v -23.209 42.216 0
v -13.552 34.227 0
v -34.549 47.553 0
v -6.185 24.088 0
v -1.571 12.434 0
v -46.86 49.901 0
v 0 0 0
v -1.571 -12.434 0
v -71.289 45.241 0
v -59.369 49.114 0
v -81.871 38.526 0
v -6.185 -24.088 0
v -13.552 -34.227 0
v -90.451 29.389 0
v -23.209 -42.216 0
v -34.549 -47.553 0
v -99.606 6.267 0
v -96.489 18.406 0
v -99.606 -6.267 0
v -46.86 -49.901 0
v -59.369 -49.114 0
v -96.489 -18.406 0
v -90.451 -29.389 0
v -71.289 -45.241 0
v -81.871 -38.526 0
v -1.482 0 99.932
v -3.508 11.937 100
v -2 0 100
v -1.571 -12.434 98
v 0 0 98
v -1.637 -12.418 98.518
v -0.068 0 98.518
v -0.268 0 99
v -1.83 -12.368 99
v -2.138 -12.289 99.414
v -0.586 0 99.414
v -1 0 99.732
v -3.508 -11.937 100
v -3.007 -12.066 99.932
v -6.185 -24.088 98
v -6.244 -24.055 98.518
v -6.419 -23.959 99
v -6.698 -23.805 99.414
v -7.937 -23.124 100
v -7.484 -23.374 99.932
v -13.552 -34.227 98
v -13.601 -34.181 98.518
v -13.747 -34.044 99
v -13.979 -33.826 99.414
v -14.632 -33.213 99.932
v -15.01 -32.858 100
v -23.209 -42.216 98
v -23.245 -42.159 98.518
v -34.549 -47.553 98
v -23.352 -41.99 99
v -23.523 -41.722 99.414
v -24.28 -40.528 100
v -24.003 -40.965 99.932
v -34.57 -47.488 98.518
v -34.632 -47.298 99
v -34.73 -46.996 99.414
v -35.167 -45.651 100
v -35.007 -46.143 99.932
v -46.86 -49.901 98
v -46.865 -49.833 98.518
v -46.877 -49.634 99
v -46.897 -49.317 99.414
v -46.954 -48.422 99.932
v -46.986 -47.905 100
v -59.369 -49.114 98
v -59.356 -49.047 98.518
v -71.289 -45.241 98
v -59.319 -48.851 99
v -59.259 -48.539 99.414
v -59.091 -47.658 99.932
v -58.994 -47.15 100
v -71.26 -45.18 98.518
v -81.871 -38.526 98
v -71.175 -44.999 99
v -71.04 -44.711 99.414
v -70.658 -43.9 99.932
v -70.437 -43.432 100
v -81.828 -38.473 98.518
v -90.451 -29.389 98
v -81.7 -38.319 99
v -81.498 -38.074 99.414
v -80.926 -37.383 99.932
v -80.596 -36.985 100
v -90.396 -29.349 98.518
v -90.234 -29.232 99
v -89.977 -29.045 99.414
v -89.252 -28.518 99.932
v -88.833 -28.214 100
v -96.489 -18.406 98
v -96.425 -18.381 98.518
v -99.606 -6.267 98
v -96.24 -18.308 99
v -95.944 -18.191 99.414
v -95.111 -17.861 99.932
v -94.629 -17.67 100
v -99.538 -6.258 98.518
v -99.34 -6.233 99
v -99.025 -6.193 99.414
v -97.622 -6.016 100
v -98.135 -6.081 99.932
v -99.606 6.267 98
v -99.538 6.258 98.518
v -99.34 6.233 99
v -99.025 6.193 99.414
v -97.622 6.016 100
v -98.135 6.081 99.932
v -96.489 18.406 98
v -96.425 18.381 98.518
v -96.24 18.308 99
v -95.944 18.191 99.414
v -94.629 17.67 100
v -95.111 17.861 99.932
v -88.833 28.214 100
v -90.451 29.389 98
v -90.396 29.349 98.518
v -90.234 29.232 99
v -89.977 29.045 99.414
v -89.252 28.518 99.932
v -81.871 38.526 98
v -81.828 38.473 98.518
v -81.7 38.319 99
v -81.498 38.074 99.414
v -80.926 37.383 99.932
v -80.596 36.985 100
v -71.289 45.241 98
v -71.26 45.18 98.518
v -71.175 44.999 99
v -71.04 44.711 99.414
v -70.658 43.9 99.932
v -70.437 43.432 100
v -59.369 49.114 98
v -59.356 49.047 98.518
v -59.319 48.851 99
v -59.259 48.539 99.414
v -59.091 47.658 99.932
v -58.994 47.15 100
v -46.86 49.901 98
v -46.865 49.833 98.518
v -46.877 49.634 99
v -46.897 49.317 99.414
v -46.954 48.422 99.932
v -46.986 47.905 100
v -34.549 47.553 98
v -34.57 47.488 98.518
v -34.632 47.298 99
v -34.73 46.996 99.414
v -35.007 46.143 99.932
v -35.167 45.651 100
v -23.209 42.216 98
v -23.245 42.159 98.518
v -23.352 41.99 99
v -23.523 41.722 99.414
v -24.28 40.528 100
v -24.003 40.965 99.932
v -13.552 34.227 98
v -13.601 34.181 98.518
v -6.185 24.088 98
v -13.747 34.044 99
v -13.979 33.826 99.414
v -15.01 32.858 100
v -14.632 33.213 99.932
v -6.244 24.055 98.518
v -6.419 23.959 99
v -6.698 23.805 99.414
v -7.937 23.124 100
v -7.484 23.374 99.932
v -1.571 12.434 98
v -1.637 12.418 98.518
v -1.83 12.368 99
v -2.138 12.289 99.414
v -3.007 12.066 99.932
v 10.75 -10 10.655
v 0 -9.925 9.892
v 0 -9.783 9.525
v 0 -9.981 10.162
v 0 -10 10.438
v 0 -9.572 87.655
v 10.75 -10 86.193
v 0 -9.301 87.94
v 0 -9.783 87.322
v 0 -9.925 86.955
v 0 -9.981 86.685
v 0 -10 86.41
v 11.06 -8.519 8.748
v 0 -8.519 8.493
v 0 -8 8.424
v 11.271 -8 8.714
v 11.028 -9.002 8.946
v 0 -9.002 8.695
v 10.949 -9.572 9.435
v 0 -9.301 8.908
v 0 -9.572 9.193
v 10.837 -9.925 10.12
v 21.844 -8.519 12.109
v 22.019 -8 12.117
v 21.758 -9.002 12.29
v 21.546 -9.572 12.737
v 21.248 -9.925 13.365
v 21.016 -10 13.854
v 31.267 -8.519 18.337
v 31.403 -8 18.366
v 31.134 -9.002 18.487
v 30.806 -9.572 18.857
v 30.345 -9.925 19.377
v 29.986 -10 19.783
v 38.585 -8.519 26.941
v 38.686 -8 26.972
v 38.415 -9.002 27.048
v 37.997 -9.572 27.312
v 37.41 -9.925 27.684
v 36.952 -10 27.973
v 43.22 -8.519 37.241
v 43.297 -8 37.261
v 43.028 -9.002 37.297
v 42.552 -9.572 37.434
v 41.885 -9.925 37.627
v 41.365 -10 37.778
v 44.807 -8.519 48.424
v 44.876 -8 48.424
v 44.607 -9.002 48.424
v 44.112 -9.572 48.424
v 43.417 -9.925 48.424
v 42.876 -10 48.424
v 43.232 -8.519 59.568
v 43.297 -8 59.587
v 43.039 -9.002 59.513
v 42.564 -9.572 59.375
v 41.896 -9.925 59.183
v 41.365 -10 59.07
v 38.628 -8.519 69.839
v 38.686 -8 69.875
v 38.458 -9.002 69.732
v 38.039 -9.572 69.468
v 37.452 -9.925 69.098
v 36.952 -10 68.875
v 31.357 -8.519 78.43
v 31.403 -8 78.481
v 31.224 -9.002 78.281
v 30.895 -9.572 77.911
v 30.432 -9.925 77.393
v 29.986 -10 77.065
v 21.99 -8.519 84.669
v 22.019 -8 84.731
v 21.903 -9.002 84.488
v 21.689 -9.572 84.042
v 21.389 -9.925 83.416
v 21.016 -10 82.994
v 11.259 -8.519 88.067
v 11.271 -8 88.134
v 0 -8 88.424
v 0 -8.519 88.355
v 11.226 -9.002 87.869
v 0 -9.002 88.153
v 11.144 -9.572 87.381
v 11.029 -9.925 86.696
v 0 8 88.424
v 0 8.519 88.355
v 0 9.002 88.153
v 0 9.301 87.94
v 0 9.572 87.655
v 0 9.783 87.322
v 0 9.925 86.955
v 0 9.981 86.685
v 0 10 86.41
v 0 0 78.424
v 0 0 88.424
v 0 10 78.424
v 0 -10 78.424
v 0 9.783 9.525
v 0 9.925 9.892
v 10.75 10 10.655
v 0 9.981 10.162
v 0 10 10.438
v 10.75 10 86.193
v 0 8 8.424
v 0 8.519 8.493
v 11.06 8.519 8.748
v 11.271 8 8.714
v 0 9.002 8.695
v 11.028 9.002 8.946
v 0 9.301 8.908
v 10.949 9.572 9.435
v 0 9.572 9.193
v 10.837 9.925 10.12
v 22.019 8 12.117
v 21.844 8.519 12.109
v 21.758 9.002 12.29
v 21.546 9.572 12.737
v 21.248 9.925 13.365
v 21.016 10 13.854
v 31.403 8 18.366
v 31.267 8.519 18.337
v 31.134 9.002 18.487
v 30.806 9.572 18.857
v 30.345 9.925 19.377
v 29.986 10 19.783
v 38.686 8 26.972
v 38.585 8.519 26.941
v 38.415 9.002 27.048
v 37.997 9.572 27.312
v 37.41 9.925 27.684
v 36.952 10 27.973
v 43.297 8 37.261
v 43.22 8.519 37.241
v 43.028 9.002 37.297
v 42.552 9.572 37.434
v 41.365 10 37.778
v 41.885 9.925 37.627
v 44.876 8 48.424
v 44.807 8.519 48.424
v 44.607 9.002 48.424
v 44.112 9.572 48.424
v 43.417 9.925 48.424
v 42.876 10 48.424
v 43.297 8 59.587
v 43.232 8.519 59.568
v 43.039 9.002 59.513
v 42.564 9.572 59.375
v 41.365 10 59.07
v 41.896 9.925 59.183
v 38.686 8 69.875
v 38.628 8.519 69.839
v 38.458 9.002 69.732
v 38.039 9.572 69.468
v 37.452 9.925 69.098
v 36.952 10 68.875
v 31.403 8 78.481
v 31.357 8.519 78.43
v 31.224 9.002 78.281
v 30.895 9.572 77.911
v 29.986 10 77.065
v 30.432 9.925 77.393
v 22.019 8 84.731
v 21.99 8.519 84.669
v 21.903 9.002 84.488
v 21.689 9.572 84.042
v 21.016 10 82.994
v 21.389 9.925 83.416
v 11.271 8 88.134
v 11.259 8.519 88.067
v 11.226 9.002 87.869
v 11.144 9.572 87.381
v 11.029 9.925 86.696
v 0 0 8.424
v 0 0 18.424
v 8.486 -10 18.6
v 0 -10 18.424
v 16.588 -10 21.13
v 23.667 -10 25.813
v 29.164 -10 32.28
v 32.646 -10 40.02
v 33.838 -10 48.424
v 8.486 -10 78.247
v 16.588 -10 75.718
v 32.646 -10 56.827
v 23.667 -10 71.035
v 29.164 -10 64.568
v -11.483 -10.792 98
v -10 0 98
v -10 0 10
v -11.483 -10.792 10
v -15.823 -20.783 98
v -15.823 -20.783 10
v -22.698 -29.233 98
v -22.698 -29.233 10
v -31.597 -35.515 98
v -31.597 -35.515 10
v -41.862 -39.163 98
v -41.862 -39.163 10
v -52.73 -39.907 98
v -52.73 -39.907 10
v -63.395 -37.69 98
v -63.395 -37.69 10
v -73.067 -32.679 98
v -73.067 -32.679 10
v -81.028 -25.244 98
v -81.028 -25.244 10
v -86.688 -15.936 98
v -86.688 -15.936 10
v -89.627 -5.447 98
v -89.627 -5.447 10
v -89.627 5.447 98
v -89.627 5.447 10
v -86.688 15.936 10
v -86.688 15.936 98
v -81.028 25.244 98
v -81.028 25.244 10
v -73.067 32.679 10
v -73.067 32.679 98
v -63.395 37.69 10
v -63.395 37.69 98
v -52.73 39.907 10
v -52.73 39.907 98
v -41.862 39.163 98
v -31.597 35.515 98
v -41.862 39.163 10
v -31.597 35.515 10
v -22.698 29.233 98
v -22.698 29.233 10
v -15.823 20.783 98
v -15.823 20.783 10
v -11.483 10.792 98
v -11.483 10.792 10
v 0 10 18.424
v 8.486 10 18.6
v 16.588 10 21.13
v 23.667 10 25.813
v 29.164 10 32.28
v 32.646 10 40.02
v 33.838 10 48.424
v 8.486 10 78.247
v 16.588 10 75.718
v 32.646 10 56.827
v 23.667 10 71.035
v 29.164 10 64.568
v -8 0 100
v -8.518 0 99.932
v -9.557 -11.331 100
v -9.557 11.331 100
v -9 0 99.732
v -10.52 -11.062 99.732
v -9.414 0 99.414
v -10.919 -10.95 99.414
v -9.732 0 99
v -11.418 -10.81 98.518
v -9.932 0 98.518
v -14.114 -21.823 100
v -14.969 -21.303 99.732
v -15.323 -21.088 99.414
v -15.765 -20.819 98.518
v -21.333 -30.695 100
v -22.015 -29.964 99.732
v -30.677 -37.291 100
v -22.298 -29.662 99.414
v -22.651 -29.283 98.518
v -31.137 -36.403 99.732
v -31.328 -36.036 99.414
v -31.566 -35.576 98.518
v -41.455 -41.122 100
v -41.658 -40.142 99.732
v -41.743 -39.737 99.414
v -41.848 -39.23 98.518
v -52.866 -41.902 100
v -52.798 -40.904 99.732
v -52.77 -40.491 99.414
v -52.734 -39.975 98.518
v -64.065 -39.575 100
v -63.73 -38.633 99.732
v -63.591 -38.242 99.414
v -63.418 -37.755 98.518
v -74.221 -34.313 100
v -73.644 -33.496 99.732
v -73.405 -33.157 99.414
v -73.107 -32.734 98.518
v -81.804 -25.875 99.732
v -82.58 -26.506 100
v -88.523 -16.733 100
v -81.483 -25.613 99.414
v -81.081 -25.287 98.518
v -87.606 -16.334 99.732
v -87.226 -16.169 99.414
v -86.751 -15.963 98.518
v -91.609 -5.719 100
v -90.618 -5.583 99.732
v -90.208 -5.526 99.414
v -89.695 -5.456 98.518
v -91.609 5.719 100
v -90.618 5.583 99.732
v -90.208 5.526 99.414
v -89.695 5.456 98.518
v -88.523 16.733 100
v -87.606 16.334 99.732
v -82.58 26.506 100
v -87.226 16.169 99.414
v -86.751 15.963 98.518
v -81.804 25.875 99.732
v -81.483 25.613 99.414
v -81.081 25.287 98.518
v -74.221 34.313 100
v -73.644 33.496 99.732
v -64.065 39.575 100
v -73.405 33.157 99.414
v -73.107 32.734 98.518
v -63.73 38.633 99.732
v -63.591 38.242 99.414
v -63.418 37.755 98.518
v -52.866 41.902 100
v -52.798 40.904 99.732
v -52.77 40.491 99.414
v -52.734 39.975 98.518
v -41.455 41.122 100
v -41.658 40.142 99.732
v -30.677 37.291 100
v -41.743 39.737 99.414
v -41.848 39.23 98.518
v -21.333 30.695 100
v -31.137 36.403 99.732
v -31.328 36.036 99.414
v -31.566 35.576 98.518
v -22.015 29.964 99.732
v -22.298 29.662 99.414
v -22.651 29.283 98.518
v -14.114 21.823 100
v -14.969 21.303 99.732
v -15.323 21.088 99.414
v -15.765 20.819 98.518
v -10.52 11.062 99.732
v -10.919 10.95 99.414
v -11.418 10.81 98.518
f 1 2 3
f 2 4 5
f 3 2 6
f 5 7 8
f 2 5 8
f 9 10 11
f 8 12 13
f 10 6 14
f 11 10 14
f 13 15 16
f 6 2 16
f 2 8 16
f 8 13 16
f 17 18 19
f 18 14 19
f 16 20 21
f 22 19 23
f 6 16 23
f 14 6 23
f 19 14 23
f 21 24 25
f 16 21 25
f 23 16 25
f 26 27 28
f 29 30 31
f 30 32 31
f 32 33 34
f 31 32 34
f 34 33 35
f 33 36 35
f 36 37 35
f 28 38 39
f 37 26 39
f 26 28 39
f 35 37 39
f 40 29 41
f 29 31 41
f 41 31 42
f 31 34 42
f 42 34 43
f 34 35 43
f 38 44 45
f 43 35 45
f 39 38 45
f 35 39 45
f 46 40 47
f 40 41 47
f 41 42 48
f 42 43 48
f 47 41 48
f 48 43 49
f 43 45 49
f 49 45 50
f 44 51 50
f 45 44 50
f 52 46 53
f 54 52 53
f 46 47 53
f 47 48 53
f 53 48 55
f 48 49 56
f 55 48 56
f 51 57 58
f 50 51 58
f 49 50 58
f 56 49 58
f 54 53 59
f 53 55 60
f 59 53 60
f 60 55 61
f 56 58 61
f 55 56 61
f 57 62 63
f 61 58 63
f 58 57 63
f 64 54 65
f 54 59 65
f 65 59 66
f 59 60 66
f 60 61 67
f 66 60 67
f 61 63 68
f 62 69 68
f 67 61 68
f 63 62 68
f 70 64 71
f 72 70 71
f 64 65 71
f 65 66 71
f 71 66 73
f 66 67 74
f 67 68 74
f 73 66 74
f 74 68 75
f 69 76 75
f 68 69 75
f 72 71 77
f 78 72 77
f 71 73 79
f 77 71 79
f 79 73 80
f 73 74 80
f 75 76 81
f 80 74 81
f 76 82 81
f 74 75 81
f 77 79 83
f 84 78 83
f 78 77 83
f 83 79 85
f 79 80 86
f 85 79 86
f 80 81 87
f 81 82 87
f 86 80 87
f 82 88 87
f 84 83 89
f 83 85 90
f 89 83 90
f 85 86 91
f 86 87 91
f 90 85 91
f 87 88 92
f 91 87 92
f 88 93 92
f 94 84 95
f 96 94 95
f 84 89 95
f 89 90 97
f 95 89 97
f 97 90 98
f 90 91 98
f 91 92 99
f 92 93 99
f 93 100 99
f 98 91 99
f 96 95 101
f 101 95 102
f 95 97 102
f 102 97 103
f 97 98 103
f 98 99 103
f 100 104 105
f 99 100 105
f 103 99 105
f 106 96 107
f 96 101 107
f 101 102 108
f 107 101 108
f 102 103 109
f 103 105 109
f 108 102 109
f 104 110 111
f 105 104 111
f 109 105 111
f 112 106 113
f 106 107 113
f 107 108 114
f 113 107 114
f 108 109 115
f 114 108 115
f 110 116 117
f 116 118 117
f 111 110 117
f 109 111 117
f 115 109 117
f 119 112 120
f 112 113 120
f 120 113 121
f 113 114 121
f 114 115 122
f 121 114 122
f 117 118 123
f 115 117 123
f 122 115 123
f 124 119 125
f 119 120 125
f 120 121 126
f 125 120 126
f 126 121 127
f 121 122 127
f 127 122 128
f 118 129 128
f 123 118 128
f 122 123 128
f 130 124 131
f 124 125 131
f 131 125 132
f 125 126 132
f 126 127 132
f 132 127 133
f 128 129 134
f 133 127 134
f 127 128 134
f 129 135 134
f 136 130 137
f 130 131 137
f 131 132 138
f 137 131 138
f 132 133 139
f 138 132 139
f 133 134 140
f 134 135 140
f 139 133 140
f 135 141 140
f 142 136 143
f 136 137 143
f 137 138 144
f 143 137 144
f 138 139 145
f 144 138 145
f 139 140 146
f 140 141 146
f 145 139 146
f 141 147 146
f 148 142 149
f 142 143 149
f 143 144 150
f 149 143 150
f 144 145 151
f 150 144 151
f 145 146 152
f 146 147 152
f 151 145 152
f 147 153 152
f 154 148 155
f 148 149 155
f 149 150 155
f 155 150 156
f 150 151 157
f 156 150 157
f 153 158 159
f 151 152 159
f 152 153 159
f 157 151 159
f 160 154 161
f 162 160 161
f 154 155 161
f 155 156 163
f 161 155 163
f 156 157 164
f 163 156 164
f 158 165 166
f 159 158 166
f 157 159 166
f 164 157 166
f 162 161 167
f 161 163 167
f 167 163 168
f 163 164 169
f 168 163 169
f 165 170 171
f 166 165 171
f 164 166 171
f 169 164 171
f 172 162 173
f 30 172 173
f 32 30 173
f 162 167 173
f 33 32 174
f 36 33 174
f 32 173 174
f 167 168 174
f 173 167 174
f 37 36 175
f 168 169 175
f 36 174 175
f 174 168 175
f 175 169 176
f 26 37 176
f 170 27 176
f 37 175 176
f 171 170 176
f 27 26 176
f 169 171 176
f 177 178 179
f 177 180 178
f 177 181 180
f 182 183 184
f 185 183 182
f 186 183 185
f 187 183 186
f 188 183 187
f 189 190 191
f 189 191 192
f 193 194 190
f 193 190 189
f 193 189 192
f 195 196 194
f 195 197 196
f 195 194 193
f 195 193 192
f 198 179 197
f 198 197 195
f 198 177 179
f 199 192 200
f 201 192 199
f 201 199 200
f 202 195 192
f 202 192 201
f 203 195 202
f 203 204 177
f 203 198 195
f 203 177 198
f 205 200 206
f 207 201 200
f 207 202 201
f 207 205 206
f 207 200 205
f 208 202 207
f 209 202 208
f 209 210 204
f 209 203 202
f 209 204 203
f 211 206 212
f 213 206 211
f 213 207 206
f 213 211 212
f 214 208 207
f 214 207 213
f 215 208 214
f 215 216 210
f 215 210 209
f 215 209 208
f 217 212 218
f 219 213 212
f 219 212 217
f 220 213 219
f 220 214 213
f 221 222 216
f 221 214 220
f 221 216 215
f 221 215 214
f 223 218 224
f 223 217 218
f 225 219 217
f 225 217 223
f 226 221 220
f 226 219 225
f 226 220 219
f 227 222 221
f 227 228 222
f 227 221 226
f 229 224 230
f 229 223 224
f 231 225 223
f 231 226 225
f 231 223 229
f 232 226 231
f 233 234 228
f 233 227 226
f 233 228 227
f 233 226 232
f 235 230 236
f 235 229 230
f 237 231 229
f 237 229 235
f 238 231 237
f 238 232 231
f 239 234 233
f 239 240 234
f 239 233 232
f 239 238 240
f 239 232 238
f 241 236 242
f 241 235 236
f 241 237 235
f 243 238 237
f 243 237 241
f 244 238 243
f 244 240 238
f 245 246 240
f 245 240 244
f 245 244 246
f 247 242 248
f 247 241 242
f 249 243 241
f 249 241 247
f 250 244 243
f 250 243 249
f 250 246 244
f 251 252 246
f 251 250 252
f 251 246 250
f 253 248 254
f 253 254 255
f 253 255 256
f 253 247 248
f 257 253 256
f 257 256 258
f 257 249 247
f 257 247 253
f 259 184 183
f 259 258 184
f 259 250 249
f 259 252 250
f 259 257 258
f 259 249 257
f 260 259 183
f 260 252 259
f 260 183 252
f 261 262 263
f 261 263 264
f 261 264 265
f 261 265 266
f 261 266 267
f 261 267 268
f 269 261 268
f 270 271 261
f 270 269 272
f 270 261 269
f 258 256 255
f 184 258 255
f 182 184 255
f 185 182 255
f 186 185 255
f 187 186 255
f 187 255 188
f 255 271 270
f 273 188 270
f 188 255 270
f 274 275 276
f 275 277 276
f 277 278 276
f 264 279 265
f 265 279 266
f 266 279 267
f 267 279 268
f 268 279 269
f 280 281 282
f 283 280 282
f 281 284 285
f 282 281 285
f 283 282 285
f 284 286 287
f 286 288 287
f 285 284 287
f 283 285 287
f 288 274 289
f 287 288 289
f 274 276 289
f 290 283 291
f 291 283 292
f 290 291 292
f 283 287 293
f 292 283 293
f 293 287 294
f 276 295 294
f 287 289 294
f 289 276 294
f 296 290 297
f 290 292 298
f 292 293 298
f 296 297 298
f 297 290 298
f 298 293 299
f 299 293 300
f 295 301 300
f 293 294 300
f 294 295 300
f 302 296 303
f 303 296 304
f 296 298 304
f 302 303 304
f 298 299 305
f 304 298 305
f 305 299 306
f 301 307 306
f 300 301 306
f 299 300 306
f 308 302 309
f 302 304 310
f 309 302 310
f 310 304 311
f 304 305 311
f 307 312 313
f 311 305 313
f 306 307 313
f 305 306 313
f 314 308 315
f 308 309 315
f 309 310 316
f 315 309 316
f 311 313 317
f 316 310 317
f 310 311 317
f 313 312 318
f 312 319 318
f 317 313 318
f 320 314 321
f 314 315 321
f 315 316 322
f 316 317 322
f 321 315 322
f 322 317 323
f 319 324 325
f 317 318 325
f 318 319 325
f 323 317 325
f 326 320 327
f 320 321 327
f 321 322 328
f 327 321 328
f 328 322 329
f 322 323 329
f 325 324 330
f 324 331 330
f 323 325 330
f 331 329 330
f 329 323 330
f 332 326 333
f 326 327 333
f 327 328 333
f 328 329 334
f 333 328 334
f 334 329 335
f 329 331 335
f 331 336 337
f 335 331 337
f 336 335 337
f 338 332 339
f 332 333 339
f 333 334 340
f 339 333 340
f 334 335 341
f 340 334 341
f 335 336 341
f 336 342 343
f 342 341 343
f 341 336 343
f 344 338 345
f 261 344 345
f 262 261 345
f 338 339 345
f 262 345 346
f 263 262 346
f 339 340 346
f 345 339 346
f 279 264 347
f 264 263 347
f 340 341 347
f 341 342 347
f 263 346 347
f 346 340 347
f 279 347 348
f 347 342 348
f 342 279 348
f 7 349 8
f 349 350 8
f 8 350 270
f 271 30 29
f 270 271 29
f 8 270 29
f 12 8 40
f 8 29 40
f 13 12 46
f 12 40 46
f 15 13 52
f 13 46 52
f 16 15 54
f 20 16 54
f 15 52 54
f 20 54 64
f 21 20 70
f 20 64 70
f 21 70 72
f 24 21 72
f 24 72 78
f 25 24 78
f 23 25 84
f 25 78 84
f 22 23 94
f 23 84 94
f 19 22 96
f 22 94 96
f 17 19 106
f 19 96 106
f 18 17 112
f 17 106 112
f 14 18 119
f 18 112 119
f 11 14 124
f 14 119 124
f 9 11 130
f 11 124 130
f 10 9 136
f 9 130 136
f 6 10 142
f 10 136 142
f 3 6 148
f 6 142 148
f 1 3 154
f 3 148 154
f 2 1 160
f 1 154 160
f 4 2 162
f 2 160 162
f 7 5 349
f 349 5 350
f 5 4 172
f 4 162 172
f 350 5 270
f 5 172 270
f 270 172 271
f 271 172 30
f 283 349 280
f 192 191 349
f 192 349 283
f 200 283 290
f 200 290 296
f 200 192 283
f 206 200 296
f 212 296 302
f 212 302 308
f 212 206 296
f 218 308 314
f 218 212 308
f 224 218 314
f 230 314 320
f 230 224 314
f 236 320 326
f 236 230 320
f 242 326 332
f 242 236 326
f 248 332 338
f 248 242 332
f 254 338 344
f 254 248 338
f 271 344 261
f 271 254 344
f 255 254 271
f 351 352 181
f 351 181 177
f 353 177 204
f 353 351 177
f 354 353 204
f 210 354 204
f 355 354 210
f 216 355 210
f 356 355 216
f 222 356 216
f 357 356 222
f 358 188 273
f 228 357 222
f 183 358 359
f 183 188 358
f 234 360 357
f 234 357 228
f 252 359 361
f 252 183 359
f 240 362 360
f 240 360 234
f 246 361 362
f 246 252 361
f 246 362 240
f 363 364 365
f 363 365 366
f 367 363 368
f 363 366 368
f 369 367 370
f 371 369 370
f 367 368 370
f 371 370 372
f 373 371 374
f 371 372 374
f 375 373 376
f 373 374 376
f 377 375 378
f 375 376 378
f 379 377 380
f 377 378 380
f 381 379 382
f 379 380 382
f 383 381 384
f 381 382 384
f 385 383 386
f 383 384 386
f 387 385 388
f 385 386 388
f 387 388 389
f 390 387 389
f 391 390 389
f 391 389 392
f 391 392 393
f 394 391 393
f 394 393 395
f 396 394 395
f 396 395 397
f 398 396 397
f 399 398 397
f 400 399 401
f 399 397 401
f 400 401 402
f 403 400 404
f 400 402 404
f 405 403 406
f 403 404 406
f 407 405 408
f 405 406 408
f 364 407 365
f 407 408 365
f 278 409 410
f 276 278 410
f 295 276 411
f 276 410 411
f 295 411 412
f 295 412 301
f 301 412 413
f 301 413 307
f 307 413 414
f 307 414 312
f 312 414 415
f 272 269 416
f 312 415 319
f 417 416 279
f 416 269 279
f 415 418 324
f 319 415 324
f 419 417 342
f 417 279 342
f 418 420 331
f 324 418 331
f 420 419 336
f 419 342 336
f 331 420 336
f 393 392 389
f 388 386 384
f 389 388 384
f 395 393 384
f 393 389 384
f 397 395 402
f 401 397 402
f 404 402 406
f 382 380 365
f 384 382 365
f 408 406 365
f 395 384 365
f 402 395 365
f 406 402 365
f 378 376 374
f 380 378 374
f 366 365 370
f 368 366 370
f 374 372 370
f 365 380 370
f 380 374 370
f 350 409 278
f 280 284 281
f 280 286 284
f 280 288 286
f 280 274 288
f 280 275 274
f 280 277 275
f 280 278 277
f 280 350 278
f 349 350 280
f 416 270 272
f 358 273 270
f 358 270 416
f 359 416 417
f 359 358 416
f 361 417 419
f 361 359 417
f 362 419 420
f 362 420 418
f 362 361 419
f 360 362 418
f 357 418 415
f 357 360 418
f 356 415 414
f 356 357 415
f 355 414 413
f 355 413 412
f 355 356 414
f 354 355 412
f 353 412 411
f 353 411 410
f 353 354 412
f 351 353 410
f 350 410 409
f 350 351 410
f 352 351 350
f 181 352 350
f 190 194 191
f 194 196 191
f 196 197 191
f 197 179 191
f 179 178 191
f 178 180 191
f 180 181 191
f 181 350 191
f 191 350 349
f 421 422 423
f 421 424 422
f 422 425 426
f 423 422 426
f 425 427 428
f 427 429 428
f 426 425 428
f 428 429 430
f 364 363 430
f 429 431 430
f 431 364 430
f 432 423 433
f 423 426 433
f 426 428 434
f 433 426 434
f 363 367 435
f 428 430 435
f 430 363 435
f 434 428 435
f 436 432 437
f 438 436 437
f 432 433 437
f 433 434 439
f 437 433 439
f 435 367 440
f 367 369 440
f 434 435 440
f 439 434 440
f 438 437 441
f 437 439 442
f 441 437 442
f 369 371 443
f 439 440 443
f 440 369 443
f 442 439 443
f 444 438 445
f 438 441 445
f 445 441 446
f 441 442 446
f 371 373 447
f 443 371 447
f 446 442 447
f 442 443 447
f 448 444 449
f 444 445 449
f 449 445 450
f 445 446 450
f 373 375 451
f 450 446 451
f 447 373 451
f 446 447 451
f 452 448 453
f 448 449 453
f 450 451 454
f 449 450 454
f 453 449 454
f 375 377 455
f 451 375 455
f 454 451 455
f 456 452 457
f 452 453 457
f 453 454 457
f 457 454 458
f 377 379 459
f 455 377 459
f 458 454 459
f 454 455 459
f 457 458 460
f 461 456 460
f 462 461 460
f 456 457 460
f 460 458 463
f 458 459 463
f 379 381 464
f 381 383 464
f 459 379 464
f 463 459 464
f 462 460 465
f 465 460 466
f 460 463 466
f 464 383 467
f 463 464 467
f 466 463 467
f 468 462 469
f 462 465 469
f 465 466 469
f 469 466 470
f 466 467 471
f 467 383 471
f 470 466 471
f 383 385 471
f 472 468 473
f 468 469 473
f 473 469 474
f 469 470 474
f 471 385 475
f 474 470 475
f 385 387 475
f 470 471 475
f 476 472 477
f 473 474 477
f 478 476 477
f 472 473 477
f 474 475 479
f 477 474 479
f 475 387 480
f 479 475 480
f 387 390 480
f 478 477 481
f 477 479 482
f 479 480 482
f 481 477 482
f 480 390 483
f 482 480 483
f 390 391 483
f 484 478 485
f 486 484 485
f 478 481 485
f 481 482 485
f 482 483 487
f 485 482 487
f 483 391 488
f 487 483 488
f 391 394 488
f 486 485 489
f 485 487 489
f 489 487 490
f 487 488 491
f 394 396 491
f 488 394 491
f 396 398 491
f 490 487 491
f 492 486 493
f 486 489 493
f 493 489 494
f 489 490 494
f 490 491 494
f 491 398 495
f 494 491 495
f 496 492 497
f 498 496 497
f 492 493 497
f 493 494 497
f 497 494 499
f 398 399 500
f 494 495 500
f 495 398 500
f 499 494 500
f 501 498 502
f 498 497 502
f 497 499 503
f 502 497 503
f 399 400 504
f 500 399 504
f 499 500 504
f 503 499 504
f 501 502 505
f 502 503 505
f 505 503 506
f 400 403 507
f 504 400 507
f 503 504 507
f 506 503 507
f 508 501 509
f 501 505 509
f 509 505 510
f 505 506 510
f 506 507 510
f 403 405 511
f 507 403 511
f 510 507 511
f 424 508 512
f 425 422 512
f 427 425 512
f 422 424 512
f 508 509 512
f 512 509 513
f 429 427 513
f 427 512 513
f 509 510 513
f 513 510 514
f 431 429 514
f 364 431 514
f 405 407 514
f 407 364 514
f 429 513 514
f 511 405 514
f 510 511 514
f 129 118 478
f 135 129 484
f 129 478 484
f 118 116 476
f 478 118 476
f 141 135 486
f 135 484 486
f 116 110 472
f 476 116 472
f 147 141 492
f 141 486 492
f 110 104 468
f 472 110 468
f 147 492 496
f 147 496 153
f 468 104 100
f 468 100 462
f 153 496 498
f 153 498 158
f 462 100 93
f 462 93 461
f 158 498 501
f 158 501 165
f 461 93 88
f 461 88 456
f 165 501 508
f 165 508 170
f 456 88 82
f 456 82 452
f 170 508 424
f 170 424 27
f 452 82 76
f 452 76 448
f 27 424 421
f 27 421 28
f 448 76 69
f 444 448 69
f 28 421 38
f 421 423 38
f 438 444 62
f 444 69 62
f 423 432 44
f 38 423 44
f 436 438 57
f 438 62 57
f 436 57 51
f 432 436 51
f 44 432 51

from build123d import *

# Parameters (mm, degrees)
F3_DEPTH = 10
F4_DEPTH = 10
F6_R     = 2


# Not quite as in the source:
# - a fillet or chamfer that OpenCascade refuses, or shapes differently, is made with other operations: its cross-section is extruded or revolved along the edge and cut away or added


with BuildPart() as f1:
    # F0 (on Front) → F1 (revolve)
    with BuildSketch(Plane.XZ):
        Polygon((-50, 0), (0, 0), (0, 100), (-10, 100), (-10, 10), (-50, 10), align=None)
    revolve(axis=Axis((-50, 0, 5), (0, 0, -1)))

    # F2 (on Front) → F3 (join)
    with BuildSketch(Plane.XZ):
        with BuildLine():
            Line((0, 18.4238510507), (0, 8.4238510507))
            ThreePointArc((0, 8.4238510507), (44.875886677, 48.4238510507), (0, 88.4238510507))
            Line((0, 88.4238510507), (0, 78.4238510507))
            ThreePointArc((0, 78.4238510507), (33.8383705003, 48.4238510507), (0, 18.4238510507))
        make_face()
    extrude(amount=F3_DEPTH)

    # F2 (on Front) → F4 (join)
    with BuildSketch(Plane.XZ):
        with BuildLine():
            Line((0, 18.4238510507), (0, 8.4238510507))
            ThreePointArc((0, 8.4238510507), (44.875886677, 48.4238510507), (0, 88.4238510507))
            Line((0, 88.4238510507), (0, 78.4238510507))
            ThreePointArc((0, 78.4238510507), (33.8383705003, 48.4238510507), (0, 18.4238510507))
        make_face()
    extrude(amount=-F4_DEPTH)

    # F5: fillet of radius 2 on 2 edges, made by hand

    # F5_s1 → F5_t2 (revolve, cut)
    with BuildSketch(Plane.XZ):
        with BuildLine():
            ThreePointArc((0, 98), (-0.5857864376, 99.4142135624), (-2, 100))
            Line((-2, 100), (0, 100))
            Line((0, 100), (0, 98))
        make_face()
    revolve(axis=Axis((-50, 0, 100), (0, 0, -1)), mode=Mode.SUBTRACT)

    # F5_s3 → F5_t4 (revolve, cut)
    with BuildSketch(Plane.XZ):
        with BuildLine():
            ThreePointArc((-8, 100), (-9.4142135624, 99.4142135624), (-10, 98))
            Line((-10, 98), (-10, 100))
            Line((-10, 100), (-8, 100))
        make_face()
    revolve(axis=Axis((-50, 0, 100), (0, 0, -1)), mode=Mode.SUBTRACT)

    # F6
    f6_edges = [f1.edges().sort_by_distance(p)[0] for p in [
        (44.875887, -10, 48.423851),
        (44.875887, 10, 48.423851),
    ]]
    fillet(f6_edges, radius=F6_R)


solid = f1.part
